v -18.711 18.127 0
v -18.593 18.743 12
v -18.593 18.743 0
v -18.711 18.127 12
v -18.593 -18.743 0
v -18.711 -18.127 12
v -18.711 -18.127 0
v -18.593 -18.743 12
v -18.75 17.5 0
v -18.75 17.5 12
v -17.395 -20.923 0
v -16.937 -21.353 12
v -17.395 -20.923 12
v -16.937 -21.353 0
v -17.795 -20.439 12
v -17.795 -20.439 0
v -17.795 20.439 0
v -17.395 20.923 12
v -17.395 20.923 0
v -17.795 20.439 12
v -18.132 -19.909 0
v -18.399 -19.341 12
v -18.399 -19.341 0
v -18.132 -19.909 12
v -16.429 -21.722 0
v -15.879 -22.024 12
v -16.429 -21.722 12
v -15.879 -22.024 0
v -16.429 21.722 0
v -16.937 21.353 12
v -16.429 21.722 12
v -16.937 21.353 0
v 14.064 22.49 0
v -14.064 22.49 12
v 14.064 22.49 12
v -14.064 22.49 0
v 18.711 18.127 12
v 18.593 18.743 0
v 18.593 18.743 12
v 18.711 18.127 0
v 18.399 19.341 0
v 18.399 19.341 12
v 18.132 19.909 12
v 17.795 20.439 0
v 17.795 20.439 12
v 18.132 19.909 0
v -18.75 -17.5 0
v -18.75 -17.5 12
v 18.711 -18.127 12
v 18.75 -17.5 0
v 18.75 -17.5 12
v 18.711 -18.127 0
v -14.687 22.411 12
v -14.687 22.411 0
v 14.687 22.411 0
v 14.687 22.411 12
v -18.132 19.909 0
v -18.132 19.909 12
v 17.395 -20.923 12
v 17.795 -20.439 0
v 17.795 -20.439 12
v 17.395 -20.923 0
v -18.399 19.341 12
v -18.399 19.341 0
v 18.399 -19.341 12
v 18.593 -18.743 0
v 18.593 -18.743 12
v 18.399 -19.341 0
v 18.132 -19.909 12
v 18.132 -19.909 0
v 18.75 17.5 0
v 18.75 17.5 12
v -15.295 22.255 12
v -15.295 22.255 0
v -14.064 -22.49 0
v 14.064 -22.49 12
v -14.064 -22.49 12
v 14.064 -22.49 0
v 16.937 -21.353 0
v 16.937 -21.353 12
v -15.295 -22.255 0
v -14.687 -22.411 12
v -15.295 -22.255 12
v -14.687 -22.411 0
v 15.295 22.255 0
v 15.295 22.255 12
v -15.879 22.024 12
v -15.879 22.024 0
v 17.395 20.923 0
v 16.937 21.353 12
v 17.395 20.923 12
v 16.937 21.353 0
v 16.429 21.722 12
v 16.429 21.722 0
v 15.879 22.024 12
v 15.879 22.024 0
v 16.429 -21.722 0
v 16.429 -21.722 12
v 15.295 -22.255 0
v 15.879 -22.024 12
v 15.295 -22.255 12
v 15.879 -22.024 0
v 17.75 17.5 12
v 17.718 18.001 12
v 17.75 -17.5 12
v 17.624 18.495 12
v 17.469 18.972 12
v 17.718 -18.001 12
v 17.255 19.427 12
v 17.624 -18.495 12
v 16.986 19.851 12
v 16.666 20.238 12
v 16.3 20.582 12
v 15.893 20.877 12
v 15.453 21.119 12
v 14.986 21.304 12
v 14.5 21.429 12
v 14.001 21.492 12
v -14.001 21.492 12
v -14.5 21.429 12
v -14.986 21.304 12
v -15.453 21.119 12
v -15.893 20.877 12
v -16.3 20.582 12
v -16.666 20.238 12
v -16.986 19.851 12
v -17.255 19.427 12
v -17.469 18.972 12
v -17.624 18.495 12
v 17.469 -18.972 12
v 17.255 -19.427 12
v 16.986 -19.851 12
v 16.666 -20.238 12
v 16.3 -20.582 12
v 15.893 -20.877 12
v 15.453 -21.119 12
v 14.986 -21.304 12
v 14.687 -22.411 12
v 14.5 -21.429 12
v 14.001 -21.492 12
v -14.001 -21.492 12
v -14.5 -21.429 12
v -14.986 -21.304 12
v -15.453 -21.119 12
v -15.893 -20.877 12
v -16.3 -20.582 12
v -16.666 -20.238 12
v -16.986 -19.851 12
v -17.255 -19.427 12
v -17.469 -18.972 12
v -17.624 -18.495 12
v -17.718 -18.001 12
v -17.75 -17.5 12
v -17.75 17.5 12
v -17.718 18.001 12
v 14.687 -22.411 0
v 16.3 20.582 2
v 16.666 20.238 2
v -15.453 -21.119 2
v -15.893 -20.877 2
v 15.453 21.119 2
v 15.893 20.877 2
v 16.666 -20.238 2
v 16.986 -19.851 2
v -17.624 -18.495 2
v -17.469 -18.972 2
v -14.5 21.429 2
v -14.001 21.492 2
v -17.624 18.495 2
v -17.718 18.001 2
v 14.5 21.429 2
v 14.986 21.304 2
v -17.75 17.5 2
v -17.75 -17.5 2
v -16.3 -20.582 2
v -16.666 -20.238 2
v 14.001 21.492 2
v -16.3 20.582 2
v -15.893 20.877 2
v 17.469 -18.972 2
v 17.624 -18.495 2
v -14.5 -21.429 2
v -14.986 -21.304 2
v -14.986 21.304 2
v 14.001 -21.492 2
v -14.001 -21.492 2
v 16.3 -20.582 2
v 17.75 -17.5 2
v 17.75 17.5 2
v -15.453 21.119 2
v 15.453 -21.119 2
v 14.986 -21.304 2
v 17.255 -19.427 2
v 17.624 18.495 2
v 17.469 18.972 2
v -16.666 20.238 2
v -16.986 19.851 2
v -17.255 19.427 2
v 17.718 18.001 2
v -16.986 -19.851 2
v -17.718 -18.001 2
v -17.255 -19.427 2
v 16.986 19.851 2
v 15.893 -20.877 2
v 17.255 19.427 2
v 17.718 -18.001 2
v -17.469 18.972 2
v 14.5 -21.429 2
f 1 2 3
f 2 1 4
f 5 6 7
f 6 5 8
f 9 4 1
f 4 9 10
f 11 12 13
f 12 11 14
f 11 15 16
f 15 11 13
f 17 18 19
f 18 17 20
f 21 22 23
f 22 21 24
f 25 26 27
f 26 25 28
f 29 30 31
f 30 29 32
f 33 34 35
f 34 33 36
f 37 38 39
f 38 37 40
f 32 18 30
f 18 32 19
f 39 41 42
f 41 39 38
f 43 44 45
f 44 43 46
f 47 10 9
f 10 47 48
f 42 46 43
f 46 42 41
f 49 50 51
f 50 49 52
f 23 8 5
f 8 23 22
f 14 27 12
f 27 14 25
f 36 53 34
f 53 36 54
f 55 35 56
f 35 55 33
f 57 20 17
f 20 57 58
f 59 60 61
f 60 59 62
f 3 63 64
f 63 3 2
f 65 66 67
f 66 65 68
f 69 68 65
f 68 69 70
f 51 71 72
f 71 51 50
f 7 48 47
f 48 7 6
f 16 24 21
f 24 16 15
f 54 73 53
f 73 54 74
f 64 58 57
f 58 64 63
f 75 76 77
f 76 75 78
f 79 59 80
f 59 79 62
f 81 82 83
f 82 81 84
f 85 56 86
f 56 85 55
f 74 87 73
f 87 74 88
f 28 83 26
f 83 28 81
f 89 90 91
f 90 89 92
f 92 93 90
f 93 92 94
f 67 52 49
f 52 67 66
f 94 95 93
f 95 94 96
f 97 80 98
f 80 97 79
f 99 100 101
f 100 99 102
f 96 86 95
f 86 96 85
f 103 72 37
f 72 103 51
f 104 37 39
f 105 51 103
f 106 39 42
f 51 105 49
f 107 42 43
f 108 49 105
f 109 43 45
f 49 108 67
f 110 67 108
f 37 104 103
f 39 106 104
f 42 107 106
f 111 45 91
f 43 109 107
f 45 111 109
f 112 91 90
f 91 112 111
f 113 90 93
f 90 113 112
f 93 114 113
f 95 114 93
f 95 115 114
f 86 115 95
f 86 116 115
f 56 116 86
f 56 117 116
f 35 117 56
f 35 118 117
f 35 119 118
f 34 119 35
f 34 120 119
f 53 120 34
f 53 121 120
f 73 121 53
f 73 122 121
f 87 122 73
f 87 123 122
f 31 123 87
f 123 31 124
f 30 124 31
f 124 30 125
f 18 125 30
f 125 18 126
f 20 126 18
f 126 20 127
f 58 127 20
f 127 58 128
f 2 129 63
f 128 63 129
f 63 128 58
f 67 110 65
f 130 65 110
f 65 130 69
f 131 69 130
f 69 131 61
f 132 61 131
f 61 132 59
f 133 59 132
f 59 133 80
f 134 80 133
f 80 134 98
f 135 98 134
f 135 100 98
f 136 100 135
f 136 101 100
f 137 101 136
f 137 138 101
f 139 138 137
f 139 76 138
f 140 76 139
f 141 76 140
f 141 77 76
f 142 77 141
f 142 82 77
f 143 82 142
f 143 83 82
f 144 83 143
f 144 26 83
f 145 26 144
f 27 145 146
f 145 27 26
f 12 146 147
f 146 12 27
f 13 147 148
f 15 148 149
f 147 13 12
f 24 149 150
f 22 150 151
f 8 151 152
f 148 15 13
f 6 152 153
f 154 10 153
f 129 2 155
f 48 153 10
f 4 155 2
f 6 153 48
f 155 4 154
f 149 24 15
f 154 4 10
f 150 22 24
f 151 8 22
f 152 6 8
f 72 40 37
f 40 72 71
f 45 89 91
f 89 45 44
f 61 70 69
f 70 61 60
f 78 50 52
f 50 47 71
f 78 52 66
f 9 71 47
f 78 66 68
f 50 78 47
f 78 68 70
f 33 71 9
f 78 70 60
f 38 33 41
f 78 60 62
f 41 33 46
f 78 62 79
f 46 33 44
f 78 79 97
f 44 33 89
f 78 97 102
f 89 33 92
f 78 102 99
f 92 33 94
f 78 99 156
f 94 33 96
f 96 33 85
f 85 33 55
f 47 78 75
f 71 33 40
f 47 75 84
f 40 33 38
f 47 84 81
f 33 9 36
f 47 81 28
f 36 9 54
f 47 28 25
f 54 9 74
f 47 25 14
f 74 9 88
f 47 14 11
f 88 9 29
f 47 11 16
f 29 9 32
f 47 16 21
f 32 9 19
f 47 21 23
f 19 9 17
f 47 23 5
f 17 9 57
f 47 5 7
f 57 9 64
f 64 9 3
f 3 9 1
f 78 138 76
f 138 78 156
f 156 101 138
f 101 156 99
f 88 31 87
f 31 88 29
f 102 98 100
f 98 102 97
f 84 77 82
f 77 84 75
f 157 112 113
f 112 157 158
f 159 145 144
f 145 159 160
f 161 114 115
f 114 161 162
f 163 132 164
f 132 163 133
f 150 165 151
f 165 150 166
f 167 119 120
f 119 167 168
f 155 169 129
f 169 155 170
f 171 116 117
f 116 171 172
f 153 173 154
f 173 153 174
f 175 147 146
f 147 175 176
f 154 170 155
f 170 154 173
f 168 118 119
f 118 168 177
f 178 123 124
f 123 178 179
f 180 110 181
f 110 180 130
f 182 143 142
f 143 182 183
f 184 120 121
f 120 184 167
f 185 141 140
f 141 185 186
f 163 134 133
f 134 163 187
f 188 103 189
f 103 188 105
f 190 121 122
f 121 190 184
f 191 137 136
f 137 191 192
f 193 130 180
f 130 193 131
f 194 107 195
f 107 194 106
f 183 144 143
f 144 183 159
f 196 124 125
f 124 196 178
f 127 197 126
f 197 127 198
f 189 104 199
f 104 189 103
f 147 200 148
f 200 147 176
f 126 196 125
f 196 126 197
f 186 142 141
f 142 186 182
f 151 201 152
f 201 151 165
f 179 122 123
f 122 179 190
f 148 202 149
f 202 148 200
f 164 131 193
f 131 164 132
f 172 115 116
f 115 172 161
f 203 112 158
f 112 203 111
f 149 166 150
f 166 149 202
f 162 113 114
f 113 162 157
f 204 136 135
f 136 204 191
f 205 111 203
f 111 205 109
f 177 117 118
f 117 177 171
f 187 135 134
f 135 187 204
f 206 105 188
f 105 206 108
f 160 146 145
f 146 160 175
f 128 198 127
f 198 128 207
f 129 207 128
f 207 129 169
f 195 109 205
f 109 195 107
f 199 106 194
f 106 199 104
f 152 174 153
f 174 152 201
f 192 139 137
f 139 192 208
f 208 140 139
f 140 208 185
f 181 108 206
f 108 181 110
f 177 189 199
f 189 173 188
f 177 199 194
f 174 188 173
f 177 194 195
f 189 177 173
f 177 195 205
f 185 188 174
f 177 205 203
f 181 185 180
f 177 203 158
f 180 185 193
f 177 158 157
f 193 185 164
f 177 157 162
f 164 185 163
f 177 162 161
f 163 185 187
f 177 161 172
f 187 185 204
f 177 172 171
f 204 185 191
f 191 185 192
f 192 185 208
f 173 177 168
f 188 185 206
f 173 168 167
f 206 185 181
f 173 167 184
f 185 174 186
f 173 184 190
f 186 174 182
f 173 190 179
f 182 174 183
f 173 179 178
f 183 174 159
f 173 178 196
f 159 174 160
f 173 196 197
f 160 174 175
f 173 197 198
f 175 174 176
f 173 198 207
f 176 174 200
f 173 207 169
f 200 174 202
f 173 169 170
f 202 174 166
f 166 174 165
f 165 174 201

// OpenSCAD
$fn = 50;


difference() {
	union() {
		hull() {
			translate(v = [-13.7500000000, 17.5000000000, 0]) {
				cylinder(h = 12, r = 5);
			}
			translate(v = [13.7500000000, 17.5000000000, 0]) {
				cylinder(h = 12, r = 5);
			}
			translate(v = [-13.7500000000, -17.5000000000, 0]) {
				cylinder(h = 12, r = 5);
			}
			translate(v = [13.7500000000, -17.5000000000, 0]) {
				cylinder(h = 12, r = 5);
			}
		}
	}
	union() {
		translate(v = [0, 0, 2]) {
			hull() {
				translate(v = [-13.7500000000, 17.5000000000, 0]) {
					cylinder(h = 10, r = 4);
				}
				translate(v = [13.7500000000, 17.5000000000, 0]) {
					cylinder(h = 10, r = 4);
				}
				translate(v = [-13.7500000000, -17.5000000000, 0]) {
					cylinder(h = 10, r = 4);
				}
				translate(v = [13.7500000000, -17.5000000000, 0]) {
					cylinder(h = 10, r = 4);
				}
			}
		}
	}
}
